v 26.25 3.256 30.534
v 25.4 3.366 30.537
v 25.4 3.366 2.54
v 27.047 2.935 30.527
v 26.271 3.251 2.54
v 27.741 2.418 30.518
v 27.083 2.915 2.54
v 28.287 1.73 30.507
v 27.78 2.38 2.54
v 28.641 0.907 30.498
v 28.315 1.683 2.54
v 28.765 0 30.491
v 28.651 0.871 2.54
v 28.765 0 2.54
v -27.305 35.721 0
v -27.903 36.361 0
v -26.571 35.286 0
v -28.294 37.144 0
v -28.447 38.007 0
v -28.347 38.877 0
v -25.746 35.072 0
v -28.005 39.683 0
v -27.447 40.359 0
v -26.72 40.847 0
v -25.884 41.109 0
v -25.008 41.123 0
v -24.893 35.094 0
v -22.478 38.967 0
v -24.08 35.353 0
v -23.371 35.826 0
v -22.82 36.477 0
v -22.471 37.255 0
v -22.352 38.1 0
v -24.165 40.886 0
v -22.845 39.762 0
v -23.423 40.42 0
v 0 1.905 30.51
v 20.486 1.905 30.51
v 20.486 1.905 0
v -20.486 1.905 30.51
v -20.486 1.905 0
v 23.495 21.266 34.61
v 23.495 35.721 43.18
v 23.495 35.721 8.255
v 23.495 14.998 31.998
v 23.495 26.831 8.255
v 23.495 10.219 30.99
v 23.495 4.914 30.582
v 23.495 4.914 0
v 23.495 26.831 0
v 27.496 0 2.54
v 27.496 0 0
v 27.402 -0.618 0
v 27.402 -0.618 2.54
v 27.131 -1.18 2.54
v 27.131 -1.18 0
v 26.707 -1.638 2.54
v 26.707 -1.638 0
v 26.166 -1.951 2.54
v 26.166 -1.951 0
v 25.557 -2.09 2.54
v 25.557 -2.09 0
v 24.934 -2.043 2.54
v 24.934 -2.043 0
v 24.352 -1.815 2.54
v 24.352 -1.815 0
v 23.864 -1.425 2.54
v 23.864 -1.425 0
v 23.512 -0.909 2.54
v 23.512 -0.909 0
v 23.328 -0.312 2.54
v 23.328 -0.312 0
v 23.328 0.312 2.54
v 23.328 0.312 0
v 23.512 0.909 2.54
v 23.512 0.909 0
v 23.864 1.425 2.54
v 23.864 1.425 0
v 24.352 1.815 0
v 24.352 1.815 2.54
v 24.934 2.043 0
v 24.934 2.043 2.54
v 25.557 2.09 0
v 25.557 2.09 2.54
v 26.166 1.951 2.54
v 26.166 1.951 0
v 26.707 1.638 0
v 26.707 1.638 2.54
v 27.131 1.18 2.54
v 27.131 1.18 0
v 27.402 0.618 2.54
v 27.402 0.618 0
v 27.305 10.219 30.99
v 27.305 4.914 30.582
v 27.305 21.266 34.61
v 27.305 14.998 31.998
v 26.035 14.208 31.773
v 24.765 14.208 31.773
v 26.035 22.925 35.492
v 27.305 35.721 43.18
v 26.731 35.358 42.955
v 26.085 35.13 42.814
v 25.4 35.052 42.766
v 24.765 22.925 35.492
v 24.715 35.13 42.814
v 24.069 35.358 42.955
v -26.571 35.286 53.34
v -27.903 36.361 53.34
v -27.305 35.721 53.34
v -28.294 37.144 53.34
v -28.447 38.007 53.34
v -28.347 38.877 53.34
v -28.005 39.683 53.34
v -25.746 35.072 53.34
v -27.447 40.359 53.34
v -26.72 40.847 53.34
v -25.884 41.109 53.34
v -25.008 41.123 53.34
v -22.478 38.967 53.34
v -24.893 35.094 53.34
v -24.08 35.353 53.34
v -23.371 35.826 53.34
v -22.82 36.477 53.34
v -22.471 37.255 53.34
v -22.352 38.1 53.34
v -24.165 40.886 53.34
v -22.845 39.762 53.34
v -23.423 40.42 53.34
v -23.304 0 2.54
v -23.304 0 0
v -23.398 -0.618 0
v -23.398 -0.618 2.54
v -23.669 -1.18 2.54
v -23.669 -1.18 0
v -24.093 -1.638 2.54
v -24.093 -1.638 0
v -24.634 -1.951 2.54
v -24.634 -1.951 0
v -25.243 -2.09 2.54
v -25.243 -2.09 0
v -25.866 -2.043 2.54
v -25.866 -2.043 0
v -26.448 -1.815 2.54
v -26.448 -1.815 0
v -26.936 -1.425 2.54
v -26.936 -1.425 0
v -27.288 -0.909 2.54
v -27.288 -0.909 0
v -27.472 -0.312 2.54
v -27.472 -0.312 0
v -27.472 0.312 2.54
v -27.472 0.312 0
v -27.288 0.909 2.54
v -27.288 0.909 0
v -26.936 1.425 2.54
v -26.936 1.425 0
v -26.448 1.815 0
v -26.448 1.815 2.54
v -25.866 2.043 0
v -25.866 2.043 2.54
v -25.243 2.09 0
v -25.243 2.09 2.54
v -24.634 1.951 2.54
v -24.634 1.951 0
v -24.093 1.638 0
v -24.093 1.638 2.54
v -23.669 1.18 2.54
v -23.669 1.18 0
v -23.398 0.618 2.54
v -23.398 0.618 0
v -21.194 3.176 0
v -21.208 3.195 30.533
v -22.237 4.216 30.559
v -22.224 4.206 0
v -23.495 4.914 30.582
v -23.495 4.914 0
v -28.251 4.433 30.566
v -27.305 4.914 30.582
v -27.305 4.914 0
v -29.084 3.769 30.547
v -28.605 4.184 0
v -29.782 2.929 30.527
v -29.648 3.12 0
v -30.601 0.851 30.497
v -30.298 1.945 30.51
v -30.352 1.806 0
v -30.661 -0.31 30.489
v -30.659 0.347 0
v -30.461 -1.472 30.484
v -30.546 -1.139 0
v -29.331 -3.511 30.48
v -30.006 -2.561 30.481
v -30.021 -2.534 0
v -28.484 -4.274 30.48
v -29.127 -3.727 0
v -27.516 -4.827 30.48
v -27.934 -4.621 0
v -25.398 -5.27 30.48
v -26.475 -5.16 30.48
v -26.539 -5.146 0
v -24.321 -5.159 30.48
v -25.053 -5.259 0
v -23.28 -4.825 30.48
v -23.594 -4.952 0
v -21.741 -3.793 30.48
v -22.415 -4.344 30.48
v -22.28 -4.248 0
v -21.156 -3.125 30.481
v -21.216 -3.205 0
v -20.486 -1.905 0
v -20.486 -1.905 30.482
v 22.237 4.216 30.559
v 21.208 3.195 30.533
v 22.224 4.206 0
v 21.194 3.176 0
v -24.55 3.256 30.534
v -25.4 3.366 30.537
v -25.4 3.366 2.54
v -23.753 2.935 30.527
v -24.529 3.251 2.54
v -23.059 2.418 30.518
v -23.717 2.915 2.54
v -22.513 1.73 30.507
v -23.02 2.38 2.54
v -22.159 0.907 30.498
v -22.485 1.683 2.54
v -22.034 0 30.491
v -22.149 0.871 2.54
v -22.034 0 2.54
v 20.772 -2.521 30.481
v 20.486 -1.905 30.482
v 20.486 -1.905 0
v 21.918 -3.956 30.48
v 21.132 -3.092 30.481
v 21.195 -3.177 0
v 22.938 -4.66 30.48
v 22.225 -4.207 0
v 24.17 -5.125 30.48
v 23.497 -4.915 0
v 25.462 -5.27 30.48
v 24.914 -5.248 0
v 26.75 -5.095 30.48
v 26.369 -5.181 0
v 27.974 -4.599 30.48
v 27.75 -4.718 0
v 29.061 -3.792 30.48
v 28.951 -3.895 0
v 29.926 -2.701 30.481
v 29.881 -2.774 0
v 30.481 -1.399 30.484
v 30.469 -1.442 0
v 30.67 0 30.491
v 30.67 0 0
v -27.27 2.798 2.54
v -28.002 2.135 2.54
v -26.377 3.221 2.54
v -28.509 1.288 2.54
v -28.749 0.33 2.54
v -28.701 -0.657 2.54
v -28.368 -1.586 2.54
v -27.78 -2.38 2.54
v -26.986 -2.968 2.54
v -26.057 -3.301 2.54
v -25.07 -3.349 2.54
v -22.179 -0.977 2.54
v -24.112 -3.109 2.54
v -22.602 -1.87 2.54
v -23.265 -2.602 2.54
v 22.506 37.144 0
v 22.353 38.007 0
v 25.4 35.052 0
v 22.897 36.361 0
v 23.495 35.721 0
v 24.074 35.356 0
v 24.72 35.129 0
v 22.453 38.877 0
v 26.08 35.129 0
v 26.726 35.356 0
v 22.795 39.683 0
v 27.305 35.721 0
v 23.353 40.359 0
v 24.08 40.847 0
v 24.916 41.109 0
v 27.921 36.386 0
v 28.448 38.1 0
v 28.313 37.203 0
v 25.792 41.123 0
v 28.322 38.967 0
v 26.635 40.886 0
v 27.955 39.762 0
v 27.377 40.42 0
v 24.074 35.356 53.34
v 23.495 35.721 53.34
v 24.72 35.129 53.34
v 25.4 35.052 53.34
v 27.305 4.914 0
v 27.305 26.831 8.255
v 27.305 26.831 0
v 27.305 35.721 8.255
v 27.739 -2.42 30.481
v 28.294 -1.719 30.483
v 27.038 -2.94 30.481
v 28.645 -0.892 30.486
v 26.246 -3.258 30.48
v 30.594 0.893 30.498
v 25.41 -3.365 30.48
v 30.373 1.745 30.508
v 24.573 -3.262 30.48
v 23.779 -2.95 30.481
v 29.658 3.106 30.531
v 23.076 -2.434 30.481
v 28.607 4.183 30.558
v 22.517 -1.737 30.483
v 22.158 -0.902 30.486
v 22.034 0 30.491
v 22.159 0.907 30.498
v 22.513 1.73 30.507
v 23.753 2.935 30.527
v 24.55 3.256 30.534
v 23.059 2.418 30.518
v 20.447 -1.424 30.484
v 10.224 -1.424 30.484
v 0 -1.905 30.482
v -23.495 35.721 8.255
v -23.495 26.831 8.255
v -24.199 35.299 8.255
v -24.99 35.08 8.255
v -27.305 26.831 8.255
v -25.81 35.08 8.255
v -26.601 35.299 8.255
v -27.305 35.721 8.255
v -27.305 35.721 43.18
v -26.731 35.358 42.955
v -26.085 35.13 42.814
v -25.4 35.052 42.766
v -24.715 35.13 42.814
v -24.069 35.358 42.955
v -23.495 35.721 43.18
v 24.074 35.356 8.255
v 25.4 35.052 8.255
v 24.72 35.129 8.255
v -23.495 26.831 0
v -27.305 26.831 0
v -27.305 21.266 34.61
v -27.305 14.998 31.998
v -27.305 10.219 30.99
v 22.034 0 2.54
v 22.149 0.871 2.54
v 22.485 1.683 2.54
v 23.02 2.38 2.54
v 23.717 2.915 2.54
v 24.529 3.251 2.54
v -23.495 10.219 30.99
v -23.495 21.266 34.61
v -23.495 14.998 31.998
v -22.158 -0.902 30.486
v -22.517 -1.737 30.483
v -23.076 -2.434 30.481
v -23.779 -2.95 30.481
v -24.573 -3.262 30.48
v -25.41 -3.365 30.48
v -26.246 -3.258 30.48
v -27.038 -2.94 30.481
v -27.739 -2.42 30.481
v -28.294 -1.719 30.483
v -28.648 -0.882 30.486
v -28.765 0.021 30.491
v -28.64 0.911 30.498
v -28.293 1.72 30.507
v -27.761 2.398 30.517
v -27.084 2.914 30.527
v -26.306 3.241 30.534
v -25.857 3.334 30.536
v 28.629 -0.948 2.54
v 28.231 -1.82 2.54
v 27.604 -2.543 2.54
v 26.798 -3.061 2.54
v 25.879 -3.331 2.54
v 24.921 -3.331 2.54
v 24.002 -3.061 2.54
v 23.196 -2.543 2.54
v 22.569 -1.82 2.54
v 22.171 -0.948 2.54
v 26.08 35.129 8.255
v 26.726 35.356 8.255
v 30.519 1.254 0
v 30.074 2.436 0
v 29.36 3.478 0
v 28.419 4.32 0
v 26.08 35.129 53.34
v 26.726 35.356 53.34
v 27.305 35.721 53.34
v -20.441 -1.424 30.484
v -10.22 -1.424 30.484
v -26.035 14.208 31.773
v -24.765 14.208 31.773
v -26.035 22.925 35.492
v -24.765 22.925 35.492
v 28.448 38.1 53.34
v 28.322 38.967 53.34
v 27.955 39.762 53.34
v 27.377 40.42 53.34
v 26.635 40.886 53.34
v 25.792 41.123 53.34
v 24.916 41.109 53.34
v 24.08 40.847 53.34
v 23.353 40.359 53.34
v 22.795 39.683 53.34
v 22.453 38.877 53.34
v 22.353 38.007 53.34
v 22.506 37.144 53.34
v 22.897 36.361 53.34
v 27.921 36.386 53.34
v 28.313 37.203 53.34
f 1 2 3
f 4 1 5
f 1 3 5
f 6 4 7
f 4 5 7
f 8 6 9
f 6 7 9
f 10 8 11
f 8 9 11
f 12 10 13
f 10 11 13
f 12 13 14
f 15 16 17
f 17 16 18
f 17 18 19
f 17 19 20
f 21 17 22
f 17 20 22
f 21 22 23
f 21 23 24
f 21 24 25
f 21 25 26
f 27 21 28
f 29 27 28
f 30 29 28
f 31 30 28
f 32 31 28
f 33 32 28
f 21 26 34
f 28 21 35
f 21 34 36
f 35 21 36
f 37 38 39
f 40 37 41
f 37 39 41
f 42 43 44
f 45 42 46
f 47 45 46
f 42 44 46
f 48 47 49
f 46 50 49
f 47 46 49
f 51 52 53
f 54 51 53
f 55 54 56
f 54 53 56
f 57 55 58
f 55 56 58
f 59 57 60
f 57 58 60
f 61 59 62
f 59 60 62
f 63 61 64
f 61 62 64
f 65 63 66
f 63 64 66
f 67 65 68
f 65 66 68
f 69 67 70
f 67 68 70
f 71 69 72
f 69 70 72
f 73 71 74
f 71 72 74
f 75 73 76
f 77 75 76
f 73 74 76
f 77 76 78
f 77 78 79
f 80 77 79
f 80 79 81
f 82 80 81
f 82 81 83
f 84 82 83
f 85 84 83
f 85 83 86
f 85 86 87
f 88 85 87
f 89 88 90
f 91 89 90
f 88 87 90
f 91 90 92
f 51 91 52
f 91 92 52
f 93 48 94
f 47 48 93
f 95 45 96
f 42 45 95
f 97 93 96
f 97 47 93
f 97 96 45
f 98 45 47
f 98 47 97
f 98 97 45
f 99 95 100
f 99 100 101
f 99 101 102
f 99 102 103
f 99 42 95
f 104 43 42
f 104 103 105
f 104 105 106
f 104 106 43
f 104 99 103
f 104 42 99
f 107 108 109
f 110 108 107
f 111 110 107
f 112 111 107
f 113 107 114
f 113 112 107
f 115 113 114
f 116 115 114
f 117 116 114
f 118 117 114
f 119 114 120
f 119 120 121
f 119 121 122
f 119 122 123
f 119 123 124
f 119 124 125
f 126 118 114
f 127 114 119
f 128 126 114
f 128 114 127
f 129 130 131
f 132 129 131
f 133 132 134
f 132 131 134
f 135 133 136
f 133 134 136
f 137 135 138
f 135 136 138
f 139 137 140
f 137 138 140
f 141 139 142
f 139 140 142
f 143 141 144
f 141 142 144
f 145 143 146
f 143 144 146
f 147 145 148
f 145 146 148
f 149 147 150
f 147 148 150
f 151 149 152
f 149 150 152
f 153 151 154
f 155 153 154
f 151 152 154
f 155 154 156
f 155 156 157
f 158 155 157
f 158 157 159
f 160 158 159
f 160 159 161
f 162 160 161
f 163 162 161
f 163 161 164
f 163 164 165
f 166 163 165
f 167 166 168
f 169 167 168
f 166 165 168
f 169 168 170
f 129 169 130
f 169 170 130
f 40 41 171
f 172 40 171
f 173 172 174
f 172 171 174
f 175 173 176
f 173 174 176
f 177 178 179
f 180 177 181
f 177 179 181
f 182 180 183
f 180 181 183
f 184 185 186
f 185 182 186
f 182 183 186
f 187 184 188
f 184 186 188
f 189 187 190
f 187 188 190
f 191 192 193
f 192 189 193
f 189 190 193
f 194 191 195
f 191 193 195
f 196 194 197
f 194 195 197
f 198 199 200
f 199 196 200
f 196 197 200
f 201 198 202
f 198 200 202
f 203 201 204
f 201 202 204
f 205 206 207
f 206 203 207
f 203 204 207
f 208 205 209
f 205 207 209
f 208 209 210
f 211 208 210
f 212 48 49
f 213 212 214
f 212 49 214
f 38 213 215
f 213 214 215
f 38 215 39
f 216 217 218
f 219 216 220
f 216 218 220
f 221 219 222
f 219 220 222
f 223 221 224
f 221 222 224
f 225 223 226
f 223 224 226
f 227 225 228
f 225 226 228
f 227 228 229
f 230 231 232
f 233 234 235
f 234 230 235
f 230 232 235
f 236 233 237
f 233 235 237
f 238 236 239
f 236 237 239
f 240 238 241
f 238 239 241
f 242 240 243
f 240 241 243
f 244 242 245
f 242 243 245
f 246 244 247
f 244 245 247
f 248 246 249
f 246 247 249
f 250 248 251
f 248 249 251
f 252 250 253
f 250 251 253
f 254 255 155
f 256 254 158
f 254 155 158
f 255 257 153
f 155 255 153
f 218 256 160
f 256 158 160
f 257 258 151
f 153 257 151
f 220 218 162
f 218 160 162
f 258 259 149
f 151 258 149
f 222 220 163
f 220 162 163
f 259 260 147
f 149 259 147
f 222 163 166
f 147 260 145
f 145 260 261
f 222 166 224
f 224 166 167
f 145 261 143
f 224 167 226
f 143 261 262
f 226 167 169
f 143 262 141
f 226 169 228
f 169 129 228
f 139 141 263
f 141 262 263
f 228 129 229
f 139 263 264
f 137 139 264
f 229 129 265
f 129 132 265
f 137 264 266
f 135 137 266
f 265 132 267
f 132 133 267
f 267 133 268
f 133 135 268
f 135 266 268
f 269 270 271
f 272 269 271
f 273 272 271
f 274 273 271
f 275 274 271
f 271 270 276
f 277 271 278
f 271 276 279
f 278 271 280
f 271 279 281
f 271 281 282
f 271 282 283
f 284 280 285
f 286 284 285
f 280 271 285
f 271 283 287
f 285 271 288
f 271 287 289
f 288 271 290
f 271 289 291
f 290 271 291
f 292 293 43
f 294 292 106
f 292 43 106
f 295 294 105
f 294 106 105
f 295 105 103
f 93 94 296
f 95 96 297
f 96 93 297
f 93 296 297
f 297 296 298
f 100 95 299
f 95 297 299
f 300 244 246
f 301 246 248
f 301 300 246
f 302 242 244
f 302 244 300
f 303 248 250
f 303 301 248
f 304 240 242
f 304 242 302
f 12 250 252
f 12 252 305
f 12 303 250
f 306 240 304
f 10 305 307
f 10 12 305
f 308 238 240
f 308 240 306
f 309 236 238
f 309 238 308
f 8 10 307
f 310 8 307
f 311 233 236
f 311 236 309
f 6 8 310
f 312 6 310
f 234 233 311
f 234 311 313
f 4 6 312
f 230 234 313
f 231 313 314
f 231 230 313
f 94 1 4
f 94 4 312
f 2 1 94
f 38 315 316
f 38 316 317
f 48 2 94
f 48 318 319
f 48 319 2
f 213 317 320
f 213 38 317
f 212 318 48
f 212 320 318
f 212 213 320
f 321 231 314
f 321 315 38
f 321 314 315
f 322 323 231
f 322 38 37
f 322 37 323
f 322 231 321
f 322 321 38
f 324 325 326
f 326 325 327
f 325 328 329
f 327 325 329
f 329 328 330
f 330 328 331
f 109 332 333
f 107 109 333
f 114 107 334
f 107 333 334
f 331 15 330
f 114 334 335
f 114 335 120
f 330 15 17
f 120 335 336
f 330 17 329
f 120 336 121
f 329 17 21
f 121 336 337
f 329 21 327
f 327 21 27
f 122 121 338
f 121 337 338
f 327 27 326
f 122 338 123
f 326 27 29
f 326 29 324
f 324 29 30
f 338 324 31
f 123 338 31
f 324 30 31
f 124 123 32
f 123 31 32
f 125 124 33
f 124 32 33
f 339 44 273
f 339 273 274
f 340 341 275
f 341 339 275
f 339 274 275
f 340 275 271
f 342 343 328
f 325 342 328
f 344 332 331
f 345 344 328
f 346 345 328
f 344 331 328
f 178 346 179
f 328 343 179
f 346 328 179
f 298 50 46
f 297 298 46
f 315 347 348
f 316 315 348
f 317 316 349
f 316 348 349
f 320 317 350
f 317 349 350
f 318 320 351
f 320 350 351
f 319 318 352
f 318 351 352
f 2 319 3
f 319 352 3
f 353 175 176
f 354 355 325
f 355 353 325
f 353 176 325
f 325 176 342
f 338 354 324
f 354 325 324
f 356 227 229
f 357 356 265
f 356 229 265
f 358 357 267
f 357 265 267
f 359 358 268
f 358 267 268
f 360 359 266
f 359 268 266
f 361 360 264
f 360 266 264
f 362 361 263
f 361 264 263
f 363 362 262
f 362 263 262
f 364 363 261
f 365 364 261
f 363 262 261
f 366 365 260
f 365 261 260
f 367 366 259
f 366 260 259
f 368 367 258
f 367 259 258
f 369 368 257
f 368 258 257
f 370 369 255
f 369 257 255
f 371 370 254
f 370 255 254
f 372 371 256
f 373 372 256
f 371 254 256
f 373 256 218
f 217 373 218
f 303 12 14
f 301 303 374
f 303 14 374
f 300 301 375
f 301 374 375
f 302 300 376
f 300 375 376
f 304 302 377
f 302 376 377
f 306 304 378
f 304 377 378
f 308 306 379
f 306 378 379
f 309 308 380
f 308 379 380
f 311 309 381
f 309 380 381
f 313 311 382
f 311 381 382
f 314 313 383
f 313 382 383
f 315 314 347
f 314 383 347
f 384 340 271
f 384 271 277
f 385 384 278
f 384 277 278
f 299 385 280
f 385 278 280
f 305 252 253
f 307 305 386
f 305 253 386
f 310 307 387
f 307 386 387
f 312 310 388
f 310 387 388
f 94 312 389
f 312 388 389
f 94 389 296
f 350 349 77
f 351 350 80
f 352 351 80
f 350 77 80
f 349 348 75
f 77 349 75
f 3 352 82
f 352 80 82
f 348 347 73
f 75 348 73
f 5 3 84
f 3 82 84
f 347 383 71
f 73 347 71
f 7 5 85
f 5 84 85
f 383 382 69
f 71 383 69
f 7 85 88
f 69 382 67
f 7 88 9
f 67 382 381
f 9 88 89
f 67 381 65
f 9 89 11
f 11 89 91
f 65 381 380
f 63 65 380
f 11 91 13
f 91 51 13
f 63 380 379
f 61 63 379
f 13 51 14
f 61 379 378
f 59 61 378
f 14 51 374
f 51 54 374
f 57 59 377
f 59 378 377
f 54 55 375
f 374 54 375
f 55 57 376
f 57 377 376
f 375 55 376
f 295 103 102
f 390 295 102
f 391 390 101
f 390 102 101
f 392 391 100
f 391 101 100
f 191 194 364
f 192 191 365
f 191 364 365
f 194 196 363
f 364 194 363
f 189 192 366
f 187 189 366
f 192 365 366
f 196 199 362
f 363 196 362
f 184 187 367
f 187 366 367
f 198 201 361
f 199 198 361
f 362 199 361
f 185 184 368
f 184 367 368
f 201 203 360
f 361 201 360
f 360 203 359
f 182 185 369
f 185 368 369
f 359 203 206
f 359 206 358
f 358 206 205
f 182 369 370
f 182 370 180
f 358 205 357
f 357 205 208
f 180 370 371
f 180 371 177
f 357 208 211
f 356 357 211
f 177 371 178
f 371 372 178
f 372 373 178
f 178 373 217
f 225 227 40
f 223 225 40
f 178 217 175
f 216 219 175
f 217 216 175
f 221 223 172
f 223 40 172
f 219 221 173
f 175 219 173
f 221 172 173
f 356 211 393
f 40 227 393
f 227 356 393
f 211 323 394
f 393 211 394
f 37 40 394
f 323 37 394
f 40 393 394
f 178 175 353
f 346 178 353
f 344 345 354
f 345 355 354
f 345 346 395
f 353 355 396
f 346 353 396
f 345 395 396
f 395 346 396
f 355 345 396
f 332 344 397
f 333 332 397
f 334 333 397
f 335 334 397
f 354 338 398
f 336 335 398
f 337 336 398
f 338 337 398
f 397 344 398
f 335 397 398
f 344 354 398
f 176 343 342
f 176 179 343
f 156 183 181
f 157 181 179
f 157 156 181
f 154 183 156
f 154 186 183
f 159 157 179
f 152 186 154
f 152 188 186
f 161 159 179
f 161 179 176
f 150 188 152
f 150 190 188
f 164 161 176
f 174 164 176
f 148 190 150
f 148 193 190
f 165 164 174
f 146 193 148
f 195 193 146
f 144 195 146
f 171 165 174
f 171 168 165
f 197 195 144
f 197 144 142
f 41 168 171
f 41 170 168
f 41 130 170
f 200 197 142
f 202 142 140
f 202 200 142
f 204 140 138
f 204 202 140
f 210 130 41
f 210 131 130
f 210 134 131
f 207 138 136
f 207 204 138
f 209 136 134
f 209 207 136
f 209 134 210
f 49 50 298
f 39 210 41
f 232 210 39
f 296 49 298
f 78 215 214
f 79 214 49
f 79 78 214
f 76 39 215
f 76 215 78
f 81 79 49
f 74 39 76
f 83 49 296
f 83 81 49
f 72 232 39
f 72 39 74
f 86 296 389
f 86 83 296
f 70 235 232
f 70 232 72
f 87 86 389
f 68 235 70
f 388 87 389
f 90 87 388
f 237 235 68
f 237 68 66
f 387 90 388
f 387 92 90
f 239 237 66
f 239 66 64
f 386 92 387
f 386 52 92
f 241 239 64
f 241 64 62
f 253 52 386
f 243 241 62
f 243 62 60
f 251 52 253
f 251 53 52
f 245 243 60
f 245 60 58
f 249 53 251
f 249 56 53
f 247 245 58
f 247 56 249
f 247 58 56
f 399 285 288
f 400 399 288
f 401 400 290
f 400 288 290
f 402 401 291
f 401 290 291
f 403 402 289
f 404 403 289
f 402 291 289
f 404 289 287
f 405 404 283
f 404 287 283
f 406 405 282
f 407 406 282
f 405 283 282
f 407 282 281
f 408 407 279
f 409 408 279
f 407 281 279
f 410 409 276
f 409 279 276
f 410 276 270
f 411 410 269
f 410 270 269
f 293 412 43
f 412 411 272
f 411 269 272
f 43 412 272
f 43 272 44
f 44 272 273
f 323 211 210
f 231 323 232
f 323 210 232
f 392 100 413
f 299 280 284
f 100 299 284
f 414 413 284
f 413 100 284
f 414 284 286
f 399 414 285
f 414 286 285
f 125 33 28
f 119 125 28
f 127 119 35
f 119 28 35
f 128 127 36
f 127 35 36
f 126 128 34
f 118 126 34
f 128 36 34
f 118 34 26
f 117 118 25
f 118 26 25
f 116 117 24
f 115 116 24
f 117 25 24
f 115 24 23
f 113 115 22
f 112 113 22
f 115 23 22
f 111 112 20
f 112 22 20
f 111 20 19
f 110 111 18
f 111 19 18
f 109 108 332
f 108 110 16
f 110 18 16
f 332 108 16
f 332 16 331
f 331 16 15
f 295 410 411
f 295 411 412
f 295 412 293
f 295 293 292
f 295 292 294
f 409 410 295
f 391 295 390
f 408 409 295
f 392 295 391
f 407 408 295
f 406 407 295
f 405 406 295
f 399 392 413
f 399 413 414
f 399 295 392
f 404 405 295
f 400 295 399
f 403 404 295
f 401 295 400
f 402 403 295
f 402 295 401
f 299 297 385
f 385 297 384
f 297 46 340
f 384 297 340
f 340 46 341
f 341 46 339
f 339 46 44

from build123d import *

# Parameters (mm, degrees)
F1_DEPTH = 50.8
F2_W     = 8.89
F2_H     = 8.255
F3_DEPTH = 38.1
F4_R     = 3.3655
F4_R_2   = 2.0955
F5_DEPTH = 2.54
F6_DEPTH = 53.34


with BuildPart() as f1:
    # F0 (on Top) → F1 (new body)
    with BuildSketch(Plane.XY):
        with BuildLine():
            Line((-27.305, 3.3655), (-27.305, 4.9141779831))
            ThreePointArc((-27.305, 4.9141779831), (-29.1268062902, -3.7268062902), (-20.4858220169, -1.905))
            Line((-20.4858220169, -1.905), (-22.0345, -1.905))
            Line((-22.0345, -1.905), (-22.0345, 0))
            ThreePointArc((-22.0345, 0), (-27.7797678721, -2.3797678721), (-25.4, 3.3655))
            Line((-25.4, 3.3655), (-27.305, 3.3655))
        make_face()
        with BuildLine():
            ThreePointArc((-23.495, 35.7206557626), (-25.4, 35.052), (-27.305, 35.7206557626))
            Line((-27.305, 35.7206557626), (-27.305, 4.9141779831))
            ThreePointArc((-27.305, 4.9141779831), (-25.4, 5.2705), (-23.495, 4.9141779831))
            Line((-23.495, 4.9141779831), (-23.495, 35.7206557626))
        make_face()
        with BuildLine():
            ThreePointArc((-23.495, 4.9141779831), (-25.4, 5.2705), (-27.305, 4.9141779831))
            Line((-27.305, 4.9141779831), (-27.305, 3.3655))
            Line((-27.305, 3.3655), (-25.4, 3.3655))
            Line((-25.4, 3.3655), (-23.495, 3.3655))
            Line((-23.495, 3.3655), (-23.495, 4.9141779831))
        make_face()
        with BuildLine():
            Line((-22.0345, -1.905), (-20.4858220169, -1.905))
            ThreePointArc((-20.4858220169, -1.905), (-20.2193463101, -0.9690188826), (-20.1295, 0))
            ThreePointArc((-20.1295, 0), (-20.2193463101, 0.9690188826), (-20.4858220169, 1.905))
            Line((-20.4858220169, 1.905), (-22.0345, 1.905))
            Line((-22.0345, 1.905), (-22.0345, 0))
            Line((-22.0345, 0), (-22.0345, -1.905))
        make_face()
        with BuildLine():
            ThreePointArc((-20.4858220169, 1.905), (-21.6731937098, 3.7268062902), (-23.495, 4.9141779831))
            Line((-23.495, 4.9141779831), (-23.495, 3.3655))
            Line((-23.495, 3.3655), (-25.4, 3.3655))
            ThreePointArc((-25.4, 3.3655), (-23.0202321279, 2.3797678721), (-22.0345, 0))
            Line((-22.0345, 0), (-22.0345, 1.905))
            Line((-22.0345, 1.905), (-20.4858220169, 1.905))
        make_face()
        with BuildLine():
            ThreePointArc((-20.1295, 0), (-20.2193463101, -0.9690188826), (-20.4858220169, -1.905))
            Line((-20.4858220169, -1.905), (0, -1.905))
            Line((0, -1.905), (0, 0))
            Line((0, 0), (0, 1.905))
            Line((0, 1.905), (-20.4858220169, 1.905))
            ThreePointArc((-20.4858220169, 1.905), (-20.2193463101, 0.9690188826), (-20.1295, 0))
        make_face()
        with BuildLine():
            Line((20.4858220169, 1.905), (0, 1.905))
            Line((0, 1.905), (0, 0))
            Line((0, 0), (20.1295, 0))
            ThreePointArc((20.1295, 0), (20.2193463101, 0.9690188826), (20.4858220169, 1.905))
        make_face()
        with BuildLine():
            Line((22.0345, 1.905), (20.4858220169, 1.905))
            ThreePointArc((20.4858220169, 1.905), (20.2193463101, 0.9690188826), (20.1295, 0))
            Line((20.1295, 0), (22.0345, 0))
            Line((22.0345, 0), (22.0345, 1.905))
        make_face()
        with BuildLine():
            Line((22.0345, -1.905), (20.4858220169, -1.905))
            ThreePointArc((20.4858220169, -1.905), (26.3690188826, -5.1806536899), (30.6705, 0))
            ThreePointArc((30.6705, 0), (29.7484751782, 2.9780755321), (27.305, 4.9141779831))
            Line((27.305, 4.9141779831), (27.305, 3.3655))
            Line((27.305, 3.3655), (25.4, 3.3655))
            ThreePointArc((25.4, 3.3655), (27.7797678721, 2.3797678721), (28.7655, 0))
            ThreePointArc((28.7655, 0), (25.4, -3.3655), (22.0345, 0))
            Line((22.0345, 0), (22.0345, -1.905))
        make_face()
        with BuildLine():
            ThreePointArc((20.1295, 0), (20.2193463101, -0.9690188826), (20.4858220169, -1.905))
            Line((20.4858220169, -1.905), (22.0345, -1.905))
            Line((22.0345, -1.905), (22.0345, 0))
            Line((22.0345, 0), (20.1295, 0))
        make_face()
        with BuildLine():
            Line((0, 0), (0, -1.905))
            Line((0, -1.905), (20.4858220169, -1.905))
            ThreePointArc((20.4858220169, -1.905), (20.2193463101, -0.9690188826), (20.1295, 0))
            Line((20.1295, 0), (0, 0))
        make_face()
        with BuildLine():
            Line((27.305, 3.3655), (27.305, 4.9141779831))
            ThreePointArc((27.305, 4.9141779831), (26.3690188826, 5.1806536899), (25.4, 5.2705))
            Line((25.4, 5.2705), (25.4, 3.3655))
            Line((25.4, 3.3655), (27.305, 3.3655))
        make_face()
        with BuildLine():
            ThreePointArc((25.4, 5.2705), (26.3690188826, 5.1806536899), (27.305, 4.9141779831))
            Line((27.305, 4.9141779831), (27.305, 35.7206557626))
            ThreePointArc((27.305, 35.7206557626), (26.4094708427, 35.2240179733), (25.4, 35.052))
            Line((25.4, 35.052), (25.4, 5.2705))
        make_face()
        with BuildLine():
            Line((23.495, 35.7206557626), (23.495, 4.9141779831))
            ThreePointArc((23.495, 4.9141779831), (24.4309811174, 5.1806536899), (25.4, 5.2705))
            Line((25.4, 5.2705), (25.4, 35.052))
            ThreePointArc((25.4, 35.052), (24.3905291573, 35.2240179733), (23.495, 35.7206557626))
        make_face()
        with BuildLine():
            ThreePointArc((25.4, 5.2705), (24.4309811174, 5.1806536899), (23.495, 4.9141779831))
            Line((23.495, 4.9141779831), (23.495, 3.3655))
            Line((23.495, 3.3655), (25.4, 3.3655))
            Line((25.4, 3.3655), (25.4, 5.2705))
        make_face()
        with BuildLine():
            ThreePointArc((23.495, 4.9141779831), (21.6731937098, 3.7268062902), (20.4858220169, 1.905))
            Line((20.4858220169, 1.905), (22.0345, 1.905))
            Line((22.0345, 1.905), (22.0345, 0))
            ThreePointArc((22.0345, 0), (23.0202321279, 2.3797678721), (25.4, 3.3655))
            Line((25.4, 3.3655), (23.495, 3.3655))
            Line((23.495, 3.3655), (23.495, 4.9141779831))
        make_face()
    extrude(amount=F1_DEPTH)

    # F2 (on Right) → F3 (cut, symmetric)
    with BuildSketch(Plane.YZ):
        with Locations((31.2756557626, 4.1275)):
            Rectangle(F2_W, F2_H)
        with BuildLine():
            Line((4.9141779831, 50.8), (4.9141779831, 30.582289685))
            add(Edge.make_bspline(
                [(4.9141779831, 30.582289685), (16.0486069147, 30.9902963569), (19.3334478065, 33.025734419), (35.7206557626, 43.18)],
                knots=[8.6020682106, 8.6020682106, 8.6020682106, 8.6020682106, 42.9134576882, 42.9134576882, 42.9134576882, 42.9134576882], degree=3))
            Line((35.7206557626, 43.18), (35.7206557626, 50.8))
            Line((35.7206557626, 50.8), (4.9141779831, 50.8))
        make_face()
        with BuildLine():
            add(Edge.make_bspline(
                [(-5.2705, 30.48), (-1.1621300748, 30.48), (2.1227108169, 30.48), (4.9141779831, 30.582289685)],
                knots=[0, 0, 0, 0, 8.6020682106, 8.6020682106, 8.6020682106, 8.6020682106], degree=3))
            Line((4.9141779831, 30.582289685), (4.9141779831, 50.8))
            Line((4.9141779831, 50.8), (-5.2705, 50.8))
            Line((-5.2705, 50.8), (-5.2705, 30.48))
        make_face()
    extrude(amount=F3_DEPTH, both=True, mode=Mode.SUBTRACT)

    # F4 (on face) → F5 (join)
    with BuildSketch(Plane(origin=(0, 0, 0), x_dir=(1, 0, 0), z_dir=(0, 0, -1))):
        with Locations((-25.4, 0)):
            Circle(F4_R)
        with Locations((-25.4, 0)):
            Circle(F4_R_2, mode=Mode.SUBTRACT)
        with BuildLine():
            ThreePointArc((30.6705, 0), (26.3690188826, 5.1806536899), (20.4858220169, 1.905))
            ThreePointArc((20.4858220169, 1.905), (20.1295, 0), (20.4858220169, -1.905))
            ThreePointArc((20.4858220169, -1.905), (21.6731937098, -3.7268062902), (23.495, -4.9141779831))
            ThreePointArc((23.495, -4.9141779831), (25.4, -5.2705), (27.305, -4.9141779831))
            ThreePointArc((27.305, -4.9141779831), (29.7484751782, -2.9780755321), (30.6705, 0))
        make_face()
        with Locations((25.4, 0)):
            Circle(F4_R, mode=Mode.SUBTRACT)
        with Locations((25.4, 0)):
            Circle(F4_R)
        with Locations((25.4, 0)):
            Circle(F4_R_2, mode=Mode.SUBTRACT)
    extrude(amount=-F5_DEPTH)

    # F0 (on Top) → F6 (join)
    with BuildSketch(Plane.XY):
        with BuildLine():
            Line((-27.305, 38.1), (-27.305, 35.7206557626))
            ThreePointArc((-27.305, 35.7206557626), (-25.4, 35.052), (-23.495, 35.7206557626))
            Line((-23.495, 35.7206557626), (-23.495, 38.1))
            Line((-23.495, 38.1), (-27.305, 38.1))
        make_face()
        with BuildLine():
            ThreePointArc((-23.495, 35.7206557626), (-22.6525699281, 36.7801772846), (-22.352, 38.1))
            ThreePointArc((-22.352, 38.1), (-26.7198227154, 40.8474300719), (-27.305, 35.7206557626))
            Line((-27.305, 35.7206557626), (-27.305, 38.1))
            Line((-27.305, 38.1), (-23.495, 38.1))
            Line((-23.495, 38.1), (-23.495, 35.7206557626))
        make_face()
        with BuildLine():
            ThreePointArc((28.448, 38.1), (24.0801772846, 40.8474300719), (23.495, 35.7206557626))
            Line((23.495, 35.7206557626), (23.495, 38.1))
            Line((23.495, 38.1), (25.4, 38.1))
            Line((25.4, 38.1), (27.305, 38.1))
            Line((27.305, 38.1), (27.305, 35.7206557626))
            ThreePointArc((27.305, 35.7206557626), (28.1474300719, 36.7801772846), (28.448, 38.1))
        make_face()
        with BuildLine():
            ThreePointArc((25.4, 35.052), (26.4094708427, 35.2240179733), (27.305, 35.7206557626))
            Line((27.305, 35.7206557626), (27.305, 38.1))
            Line((27.305, 38.1), (25.4, 38.1))
            Line((25.4, 38.1), (25.4, 35.052))
        make_face()
        with BuildLine():
            Line((23.495, 38.1), (23.495, 35.7206557626))
            ThreePointArc((23.495, 35.7206557626), (24.3905291573, 35.2240179733), (25.4, 35.052))
            Line((25.4, 35.052), (25.4, 38.1))
            Line((25.4, 38.1), (23.495, 38.1))
        make_face()
    extrude(amount=F6_DEPTH)


solid = f1.part
